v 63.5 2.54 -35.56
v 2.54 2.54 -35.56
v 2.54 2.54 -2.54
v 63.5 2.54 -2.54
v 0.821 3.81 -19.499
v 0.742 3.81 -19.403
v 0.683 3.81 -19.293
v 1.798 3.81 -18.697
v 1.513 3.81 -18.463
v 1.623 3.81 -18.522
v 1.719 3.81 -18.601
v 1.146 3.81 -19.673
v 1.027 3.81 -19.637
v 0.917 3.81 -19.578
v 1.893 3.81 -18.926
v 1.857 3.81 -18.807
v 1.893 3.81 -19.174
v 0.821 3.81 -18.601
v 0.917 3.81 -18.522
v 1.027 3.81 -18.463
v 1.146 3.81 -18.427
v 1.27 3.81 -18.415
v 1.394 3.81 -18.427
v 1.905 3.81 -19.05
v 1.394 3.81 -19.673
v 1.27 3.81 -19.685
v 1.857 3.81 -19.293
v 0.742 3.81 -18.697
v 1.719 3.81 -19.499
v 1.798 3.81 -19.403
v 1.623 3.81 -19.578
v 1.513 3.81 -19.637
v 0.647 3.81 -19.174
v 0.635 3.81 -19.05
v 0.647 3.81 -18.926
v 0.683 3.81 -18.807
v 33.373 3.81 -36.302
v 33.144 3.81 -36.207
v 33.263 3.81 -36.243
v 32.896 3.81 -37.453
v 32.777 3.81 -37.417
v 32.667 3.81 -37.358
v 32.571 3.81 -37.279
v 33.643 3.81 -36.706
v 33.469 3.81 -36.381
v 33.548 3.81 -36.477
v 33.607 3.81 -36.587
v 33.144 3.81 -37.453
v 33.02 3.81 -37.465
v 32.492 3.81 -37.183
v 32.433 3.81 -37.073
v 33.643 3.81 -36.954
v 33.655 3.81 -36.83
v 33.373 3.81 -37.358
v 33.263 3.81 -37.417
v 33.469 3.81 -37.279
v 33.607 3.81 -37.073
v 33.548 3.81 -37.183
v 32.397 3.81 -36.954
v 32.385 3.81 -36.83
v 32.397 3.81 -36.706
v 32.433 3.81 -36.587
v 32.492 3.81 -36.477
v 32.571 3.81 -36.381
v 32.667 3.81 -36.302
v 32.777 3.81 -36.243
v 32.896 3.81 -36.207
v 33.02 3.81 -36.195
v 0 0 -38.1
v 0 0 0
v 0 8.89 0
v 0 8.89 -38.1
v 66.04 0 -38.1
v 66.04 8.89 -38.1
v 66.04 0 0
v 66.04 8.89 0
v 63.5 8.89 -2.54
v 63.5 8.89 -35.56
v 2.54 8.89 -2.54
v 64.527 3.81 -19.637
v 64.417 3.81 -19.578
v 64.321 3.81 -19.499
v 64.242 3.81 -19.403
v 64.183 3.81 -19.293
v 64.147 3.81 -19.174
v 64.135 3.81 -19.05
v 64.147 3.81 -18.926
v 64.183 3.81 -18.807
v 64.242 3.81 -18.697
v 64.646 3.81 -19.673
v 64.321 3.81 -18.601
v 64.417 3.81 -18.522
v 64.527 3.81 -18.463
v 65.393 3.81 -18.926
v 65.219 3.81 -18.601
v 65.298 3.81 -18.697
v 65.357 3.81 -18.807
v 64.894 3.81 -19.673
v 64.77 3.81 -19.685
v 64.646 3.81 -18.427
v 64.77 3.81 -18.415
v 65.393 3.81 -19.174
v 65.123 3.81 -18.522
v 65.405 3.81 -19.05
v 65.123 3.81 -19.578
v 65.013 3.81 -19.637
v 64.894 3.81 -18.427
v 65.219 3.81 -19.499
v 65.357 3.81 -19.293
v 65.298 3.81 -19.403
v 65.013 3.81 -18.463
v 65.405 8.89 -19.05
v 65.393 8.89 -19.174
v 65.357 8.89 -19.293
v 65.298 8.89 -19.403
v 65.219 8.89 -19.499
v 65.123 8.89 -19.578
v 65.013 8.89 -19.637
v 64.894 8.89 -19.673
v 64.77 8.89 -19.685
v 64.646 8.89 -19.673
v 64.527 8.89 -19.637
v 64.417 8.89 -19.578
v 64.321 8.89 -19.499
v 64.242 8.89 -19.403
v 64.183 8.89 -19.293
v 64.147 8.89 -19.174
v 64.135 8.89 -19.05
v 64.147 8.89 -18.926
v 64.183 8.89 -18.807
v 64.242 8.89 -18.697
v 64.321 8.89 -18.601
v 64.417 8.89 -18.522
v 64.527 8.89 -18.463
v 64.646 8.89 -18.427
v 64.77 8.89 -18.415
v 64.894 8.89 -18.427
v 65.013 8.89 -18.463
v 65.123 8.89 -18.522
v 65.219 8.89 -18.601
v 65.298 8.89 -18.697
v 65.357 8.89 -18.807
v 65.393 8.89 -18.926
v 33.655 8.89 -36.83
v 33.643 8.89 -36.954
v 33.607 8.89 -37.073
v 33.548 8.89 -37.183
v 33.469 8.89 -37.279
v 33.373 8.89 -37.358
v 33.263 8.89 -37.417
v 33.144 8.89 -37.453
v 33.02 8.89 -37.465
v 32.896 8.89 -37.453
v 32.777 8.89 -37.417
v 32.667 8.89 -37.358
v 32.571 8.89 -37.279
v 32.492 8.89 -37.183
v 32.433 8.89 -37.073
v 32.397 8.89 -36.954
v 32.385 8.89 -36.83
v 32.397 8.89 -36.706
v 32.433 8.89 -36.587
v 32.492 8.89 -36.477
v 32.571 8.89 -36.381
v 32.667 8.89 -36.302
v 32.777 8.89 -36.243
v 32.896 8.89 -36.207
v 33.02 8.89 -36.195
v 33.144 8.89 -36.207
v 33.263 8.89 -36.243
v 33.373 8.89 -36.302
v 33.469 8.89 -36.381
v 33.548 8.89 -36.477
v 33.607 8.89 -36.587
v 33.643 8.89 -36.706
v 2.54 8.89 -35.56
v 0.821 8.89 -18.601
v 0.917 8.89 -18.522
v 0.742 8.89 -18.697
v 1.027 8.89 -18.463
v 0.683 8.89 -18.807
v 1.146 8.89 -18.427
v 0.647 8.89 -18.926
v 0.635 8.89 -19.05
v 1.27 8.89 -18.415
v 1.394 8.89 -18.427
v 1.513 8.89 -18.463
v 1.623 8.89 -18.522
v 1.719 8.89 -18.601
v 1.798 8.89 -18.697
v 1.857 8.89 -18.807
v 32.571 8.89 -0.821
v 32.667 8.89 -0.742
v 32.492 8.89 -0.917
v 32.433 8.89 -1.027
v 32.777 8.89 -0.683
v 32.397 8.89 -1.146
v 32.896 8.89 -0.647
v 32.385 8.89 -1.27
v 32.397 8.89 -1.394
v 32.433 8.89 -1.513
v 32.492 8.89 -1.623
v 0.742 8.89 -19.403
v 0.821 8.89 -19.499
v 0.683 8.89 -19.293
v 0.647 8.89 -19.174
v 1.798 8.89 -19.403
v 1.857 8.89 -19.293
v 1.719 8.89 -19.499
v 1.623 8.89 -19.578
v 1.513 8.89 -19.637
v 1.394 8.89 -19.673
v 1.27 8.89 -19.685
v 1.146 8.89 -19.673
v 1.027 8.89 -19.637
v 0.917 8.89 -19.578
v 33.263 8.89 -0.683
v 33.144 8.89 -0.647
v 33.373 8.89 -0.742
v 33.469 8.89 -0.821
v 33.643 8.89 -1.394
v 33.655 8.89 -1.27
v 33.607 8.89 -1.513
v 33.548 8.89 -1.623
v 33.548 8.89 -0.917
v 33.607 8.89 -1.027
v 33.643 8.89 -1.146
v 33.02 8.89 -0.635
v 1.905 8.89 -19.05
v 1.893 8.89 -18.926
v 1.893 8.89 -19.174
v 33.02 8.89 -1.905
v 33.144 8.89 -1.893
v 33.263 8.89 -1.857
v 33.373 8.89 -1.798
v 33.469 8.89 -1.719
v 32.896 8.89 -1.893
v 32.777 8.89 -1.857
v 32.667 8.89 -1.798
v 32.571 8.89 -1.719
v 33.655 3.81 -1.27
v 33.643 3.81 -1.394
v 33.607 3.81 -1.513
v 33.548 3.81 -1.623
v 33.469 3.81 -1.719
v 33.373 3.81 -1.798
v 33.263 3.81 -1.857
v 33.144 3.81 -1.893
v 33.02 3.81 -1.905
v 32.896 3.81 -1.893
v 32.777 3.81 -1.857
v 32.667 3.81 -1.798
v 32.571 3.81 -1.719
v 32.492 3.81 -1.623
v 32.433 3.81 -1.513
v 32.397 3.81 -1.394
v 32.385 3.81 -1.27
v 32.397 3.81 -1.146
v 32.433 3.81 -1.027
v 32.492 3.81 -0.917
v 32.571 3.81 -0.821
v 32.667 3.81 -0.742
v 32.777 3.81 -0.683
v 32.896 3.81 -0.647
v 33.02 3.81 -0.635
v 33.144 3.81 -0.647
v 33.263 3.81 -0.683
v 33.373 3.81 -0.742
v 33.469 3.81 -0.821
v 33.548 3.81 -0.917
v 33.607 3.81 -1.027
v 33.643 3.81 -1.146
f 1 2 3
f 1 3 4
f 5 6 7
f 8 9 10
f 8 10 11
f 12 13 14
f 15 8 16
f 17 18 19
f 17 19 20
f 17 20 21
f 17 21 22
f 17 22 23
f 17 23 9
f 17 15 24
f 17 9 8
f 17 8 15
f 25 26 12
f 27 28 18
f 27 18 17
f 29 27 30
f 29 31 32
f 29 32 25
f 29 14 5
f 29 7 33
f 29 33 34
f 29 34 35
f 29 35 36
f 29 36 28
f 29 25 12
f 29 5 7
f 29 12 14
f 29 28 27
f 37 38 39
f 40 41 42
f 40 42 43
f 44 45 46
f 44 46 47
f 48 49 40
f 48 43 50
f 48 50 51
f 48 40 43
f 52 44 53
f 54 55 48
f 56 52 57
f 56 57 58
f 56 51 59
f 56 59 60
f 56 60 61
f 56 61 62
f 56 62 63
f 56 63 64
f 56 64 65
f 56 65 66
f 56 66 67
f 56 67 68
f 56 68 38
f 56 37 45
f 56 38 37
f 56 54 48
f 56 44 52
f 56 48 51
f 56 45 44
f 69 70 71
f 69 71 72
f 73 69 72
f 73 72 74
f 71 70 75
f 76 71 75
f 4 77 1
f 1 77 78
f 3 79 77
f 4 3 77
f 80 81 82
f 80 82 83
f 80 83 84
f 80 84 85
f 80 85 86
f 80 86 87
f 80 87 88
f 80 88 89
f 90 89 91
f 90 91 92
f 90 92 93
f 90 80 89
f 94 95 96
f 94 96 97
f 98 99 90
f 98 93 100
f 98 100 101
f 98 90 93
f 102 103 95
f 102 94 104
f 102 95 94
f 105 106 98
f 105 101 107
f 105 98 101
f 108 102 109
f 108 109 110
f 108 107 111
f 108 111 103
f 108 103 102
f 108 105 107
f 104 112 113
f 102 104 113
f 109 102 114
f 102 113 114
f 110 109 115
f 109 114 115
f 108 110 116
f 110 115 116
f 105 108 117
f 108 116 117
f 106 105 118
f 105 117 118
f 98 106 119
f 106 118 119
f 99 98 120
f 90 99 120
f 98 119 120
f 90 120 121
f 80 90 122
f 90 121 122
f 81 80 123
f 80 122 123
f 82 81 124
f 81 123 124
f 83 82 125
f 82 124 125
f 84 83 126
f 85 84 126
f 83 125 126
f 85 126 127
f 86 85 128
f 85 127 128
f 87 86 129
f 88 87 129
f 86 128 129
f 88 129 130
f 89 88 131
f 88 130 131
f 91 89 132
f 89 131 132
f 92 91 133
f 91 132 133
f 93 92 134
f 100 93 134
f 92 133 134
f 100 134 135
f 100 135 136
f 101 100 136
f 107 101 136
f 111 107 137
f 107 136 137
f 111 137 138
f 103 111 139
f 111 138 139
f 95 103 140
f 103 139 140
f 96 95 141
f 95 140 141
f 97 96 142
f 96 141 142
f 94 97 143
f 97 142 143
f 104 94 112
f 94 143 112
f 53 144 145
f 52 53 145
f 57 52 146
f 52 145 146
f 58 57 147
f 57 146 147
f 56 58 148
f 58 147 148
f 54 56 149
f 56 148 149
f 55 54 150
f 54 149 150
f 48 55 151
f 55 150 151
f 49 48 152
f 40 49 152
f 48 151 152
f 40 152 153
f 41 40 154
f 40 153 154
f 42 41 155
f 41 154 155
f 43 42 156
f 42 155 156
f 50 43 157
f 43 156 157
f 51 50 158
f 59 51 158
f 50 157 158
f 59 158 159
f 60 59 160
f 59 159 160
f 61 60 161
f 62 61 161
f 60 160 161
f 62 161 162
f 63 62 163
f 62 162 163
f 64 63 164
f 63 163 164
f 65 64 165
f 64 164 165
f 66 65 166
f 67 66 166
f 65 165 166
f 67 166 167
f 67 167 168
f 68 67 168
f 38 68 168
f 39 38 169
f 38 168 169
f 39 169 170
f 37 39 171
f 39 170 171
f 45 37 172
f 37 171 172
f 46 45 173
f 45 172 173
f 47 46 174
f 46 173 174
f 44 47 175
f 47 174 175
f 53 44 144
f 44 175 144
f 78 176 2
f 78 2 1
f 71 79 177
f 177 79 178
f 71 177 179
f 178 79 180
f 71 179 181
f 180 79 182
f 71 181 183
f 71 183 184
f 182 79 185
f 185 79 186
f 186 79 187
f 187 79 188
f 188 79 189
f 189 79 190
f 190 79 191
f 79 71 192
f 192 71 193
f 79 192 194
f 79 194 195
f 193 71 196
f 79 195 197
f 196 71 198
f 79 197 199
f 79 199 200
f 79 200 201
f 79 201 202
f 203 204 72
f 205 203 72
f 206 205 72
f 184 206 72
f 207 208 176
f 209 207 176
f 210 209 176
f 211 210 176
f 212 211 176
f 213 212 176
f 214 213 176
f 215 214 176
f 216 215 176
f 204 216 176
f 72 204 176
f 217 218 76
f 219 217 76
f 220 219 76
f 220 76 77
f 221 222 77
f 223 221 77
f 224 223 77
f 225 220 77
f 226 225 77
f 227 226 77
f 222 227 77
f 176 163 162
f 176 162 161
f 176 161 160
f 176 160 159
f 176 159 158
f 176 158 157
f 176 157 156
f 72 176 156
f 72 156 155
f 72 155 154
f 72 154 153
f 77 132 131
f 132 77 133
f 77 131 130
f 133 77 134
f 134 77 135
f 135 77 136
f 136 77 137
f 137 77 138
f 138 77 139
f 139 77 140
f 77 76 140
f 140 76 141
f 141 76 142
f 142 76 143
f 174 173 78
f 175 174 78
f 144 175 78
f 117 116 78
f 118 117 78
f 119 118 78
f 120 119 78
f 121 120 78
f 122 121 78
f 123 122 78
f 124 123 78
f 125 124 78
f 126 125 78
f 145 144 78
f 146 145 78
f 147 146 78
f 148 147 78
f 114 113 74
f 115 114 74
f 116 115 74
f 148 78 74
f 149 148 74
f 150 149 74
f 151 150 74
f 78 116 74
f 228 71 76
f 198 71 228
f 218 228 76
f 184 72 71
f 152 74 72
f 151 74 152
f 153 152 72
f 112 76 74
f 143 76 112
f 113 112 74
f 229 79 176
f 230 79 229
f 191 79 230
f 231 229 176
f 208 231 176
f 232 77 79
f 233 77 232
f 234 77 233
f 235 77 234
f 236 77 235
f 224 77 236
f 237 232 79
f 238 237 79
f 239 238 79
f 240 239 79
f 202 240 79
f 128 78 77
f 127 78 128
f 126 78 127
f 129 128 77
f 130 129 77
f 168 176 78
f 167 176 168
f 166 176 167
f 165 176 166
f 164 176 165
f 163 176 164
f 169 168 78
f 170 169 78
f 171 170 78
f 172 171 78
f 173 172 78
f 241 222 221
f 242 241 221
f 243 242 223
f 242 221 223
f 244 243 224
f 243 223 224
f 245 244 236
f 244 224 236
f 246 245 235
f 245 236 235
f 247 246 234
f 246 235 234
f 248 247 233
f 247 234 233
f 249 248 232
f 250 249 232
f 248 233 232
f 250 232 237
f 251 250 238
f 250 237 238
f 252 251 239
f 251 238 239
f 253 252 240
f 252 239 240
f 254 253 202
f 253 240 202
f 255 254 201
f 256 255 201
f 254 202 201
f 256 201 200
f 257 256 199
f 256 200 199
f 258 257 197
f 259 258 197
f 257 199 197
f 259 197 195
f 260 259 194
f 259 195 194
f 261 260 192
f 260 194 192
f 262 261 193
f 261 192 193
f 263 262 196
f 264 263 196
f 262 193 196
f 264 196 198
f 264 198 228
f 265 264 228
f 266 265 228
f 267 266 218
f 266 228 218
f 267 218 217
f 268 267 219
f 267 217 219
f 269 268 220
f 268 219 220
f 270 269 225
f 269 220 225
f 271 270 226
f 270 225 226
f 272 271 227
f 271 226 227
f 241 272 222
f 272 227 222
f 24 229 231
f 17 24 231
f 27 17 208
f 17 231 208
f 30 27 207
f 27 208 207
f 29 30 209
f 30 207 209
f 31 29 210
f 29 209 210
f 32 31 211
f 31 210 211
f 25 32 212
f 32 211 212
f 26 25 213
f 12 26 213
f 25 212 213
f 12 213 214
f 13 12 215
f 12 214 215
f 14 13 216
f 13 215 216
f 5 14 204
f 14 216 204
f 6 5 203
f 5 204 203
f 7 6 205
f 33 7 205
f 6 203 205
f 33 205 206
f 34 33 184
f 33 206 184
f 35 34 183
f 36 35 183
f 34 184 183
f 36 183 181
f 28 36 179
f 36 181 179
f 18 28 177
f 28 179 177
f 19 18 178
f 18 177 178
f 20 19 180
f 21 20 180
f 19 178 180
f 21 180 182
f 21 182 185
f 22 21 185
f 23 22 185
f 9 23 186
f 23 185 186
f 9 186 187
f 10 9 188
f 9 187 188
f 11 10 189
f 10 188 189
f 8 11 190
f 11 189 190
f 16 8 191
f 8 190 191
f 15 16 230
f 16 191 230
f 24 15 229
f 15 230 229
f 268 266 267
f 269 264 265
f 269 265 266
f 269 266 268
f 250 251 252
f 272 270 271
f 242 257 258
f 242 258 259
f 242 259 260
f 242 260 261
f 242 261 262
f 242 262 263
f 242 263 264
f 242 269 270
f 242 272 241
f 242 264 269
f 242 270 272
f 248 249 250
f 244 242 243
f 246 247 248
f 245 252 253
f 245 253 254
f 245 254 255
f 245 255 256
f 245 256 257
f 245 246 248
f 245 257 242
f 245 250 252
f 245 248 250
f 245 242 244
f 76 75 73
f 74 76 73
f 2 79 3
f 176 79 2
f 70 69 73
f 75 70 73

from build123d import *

# Parameters (mm, degrees)
SKETCH1_W           = 66.04
SKETCH1_H           = 38.1
BOSS_EXTRUDE3_DEPTH = 17.78
SKETCH3_W           = 60.96
SKETCH3_H           = 33.02
CUT_EXTRUDE1_DEPTH  = 15.24
SKETCH4_W           = 38.1
SKETCH4_H           = 8.89
CUT_EXTRUDE2_DEPTH  = 66.04
SKETCH5_R           = 0.635
CUT_EXTRUDE3_DEPTH  = 5.08


with BuildPart() as part:
    # Sketch1 → Boss-Extrude3 (new body)
    with BuildSketch(Plane(origin=(0, 0, 0), x_dir=(1, 0, 0), z_dir=(0, 1, 0))):
        with Locations((33.02, 19.05)):
            Rectangle(SKETCH1_W, SKETCH1_H)
    extrude(amount=BOSS_EXTRUDE3_DEPTH)

    # Sketch3 → Cut-Extrude1 (cut)
    with BuildSketch(Plane(origin=(0, 17.78, 0), x_dir=(1, 0, 0), z_dir=(0, 1, 0))):
        with Locations((33.02, 19.05)):
            Rectangle(SKETCH3_W, SKETCH3_H)
    extrude(amount=-CUT_EXTRUDE1_DEPTH, mode=Mode.SUBTRACT)

    # Sketch4 → Cut-Extrude2 (cut)
    with BuildSketch(Plane(origin=(66.04, 0, 0), x_dir=(0, 0, -1), z_dir=(1, 0, 0))):
        with Locations((19.05, 13.335)):
            Rectangle(SKETCH4_W, SKETCH4_H)
    extrude(amount=-CUT_EXTRUDE2_DEPTH, mode=Mode.SUBTRACT)

    # Sketch5 → Cut-Extrude3 (cut)
    with BuildSketch(Plane(origin=(0, 8.89, 0), x_dir=(1, 0, 0), z_dir=(0, 1, 0))):
        with Locations((33.02, 36.83)):
            Circle(SKETCH5_R)
        with Locations((33.02, 1.27)):
            Circle(SKETCH5_R)
        with Locations((1.27, 19.05)):
            Circle(SKETCH5_R)
        with Locations((64.77, 19.05)):
            Circle(SKETCH5_R)
    extrude(amount=-CUT_EXTRUDE3_DEPTH, mode=Mode.SUBTRACT)


solid = part.part
